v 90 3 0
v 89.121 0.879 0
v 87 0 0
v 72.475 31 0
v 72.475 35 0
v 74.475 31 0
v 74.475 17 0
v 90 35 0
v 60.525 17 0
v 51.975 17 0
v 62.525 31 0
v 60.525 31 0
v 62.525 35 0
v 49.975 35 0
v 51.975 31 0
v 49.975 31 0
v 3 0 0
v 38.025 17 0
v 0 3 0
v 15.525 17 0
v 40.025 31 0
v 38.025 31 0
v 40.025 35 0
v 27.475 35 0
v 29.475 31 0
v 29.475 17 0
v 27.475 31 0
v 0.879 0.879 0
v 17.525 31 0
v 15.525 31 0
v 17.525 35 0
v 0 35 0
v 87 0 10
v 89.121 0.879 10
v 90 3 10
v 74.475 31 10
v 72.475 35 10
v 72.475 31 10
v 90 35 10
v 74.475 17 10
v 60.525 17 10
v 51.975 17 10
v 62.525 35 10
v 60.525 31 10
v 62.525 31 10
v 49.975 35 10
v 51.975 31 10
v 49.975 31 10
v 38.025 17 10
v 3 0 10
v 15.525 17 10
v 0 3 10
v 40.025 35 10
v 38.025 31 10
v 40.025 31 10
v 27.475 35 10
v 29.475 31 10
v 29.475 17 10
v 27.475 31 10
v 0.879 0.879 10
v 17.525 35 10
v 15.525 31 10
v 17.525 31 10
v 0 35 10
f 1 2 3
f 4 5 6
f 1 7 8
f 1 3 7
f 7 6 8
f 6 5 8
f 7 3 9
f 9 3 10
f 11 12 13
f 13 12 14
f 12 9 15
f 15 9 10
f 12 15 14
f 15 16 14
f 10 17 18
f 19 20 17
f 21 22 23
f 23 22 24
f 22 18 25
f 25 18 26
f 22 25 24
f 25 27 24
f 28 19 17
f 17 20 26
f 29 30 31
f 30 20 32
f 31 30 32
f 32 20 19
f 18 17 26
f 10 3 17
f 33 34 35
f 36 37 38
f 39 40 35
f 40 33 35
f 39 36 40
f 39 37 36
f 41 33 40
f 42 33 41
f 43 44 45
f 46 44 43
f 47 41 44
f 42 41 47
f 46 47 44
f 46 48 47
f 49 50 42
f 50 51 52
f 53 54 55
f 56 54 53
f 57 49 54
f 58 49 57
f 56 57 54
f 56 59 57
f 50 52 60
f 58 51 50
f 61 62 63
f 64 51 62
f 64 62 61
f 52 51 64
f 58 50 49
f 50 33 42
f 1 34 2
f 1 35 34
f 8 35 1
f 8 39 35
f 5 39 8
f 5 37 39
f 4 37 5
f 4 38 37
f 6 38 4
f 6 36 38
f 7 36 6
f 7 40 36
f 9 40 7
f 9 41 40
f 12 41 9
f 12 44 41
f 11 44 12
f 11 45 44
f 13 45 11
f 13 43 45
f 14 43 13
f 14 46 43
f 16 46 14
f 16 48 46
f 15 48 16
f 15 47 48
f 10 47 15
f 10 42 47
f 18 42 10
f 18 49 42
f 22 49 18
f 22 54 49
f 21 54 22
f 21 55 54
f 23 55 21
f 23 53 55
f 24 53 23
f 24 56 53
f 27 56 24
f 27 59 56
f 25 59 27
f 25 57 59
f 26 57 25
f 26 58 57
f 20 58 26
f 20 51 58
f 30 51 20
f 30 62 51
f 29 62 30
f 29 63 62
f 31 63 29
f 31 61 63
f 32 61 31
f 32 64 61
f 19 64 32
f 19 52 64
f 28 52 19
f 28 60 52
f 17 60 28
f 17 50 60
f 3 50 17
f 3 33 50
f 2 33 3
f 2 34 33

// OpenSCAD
$fn = 32;

// ----------------------------------------------------------------------
// Window plate: 90 x 35 mm, 3 open windows
// ----------------------------------------------------------------------

// --- parameters (mm) ---
profile_height = 10;      // extrusion height
profile_points = 32;      // points of the closed outline

profile = [[0, 3], [0.879, 0.879], [3, 0], [87, 0], [89.121, 0.879], [90, 3], [90, 35], [72.475, 35], [72.475, 31], [74.475, 31], [74.475, 17], [60.525, 17], [60.525, 31], [62.525, 31], [62.525, 35], [49.975, 35], [49.975, 31], [51.975, 31], [51.975, 17], [38.025, 17], [38.025, 31], [40.025, 31], [40.025, 35], [27.475, 35], [27.475, 31], [29.475, 31], [29.475, 17], [15.525, 17], [15.525, 31], [17.525, 31], [17.525, 35], [0, 35]];  // single closed polygon, 32 points, counter clockwise

// --- the one profile operation ---
linear_extrude(height = profile_height) polygon(points = profile);
